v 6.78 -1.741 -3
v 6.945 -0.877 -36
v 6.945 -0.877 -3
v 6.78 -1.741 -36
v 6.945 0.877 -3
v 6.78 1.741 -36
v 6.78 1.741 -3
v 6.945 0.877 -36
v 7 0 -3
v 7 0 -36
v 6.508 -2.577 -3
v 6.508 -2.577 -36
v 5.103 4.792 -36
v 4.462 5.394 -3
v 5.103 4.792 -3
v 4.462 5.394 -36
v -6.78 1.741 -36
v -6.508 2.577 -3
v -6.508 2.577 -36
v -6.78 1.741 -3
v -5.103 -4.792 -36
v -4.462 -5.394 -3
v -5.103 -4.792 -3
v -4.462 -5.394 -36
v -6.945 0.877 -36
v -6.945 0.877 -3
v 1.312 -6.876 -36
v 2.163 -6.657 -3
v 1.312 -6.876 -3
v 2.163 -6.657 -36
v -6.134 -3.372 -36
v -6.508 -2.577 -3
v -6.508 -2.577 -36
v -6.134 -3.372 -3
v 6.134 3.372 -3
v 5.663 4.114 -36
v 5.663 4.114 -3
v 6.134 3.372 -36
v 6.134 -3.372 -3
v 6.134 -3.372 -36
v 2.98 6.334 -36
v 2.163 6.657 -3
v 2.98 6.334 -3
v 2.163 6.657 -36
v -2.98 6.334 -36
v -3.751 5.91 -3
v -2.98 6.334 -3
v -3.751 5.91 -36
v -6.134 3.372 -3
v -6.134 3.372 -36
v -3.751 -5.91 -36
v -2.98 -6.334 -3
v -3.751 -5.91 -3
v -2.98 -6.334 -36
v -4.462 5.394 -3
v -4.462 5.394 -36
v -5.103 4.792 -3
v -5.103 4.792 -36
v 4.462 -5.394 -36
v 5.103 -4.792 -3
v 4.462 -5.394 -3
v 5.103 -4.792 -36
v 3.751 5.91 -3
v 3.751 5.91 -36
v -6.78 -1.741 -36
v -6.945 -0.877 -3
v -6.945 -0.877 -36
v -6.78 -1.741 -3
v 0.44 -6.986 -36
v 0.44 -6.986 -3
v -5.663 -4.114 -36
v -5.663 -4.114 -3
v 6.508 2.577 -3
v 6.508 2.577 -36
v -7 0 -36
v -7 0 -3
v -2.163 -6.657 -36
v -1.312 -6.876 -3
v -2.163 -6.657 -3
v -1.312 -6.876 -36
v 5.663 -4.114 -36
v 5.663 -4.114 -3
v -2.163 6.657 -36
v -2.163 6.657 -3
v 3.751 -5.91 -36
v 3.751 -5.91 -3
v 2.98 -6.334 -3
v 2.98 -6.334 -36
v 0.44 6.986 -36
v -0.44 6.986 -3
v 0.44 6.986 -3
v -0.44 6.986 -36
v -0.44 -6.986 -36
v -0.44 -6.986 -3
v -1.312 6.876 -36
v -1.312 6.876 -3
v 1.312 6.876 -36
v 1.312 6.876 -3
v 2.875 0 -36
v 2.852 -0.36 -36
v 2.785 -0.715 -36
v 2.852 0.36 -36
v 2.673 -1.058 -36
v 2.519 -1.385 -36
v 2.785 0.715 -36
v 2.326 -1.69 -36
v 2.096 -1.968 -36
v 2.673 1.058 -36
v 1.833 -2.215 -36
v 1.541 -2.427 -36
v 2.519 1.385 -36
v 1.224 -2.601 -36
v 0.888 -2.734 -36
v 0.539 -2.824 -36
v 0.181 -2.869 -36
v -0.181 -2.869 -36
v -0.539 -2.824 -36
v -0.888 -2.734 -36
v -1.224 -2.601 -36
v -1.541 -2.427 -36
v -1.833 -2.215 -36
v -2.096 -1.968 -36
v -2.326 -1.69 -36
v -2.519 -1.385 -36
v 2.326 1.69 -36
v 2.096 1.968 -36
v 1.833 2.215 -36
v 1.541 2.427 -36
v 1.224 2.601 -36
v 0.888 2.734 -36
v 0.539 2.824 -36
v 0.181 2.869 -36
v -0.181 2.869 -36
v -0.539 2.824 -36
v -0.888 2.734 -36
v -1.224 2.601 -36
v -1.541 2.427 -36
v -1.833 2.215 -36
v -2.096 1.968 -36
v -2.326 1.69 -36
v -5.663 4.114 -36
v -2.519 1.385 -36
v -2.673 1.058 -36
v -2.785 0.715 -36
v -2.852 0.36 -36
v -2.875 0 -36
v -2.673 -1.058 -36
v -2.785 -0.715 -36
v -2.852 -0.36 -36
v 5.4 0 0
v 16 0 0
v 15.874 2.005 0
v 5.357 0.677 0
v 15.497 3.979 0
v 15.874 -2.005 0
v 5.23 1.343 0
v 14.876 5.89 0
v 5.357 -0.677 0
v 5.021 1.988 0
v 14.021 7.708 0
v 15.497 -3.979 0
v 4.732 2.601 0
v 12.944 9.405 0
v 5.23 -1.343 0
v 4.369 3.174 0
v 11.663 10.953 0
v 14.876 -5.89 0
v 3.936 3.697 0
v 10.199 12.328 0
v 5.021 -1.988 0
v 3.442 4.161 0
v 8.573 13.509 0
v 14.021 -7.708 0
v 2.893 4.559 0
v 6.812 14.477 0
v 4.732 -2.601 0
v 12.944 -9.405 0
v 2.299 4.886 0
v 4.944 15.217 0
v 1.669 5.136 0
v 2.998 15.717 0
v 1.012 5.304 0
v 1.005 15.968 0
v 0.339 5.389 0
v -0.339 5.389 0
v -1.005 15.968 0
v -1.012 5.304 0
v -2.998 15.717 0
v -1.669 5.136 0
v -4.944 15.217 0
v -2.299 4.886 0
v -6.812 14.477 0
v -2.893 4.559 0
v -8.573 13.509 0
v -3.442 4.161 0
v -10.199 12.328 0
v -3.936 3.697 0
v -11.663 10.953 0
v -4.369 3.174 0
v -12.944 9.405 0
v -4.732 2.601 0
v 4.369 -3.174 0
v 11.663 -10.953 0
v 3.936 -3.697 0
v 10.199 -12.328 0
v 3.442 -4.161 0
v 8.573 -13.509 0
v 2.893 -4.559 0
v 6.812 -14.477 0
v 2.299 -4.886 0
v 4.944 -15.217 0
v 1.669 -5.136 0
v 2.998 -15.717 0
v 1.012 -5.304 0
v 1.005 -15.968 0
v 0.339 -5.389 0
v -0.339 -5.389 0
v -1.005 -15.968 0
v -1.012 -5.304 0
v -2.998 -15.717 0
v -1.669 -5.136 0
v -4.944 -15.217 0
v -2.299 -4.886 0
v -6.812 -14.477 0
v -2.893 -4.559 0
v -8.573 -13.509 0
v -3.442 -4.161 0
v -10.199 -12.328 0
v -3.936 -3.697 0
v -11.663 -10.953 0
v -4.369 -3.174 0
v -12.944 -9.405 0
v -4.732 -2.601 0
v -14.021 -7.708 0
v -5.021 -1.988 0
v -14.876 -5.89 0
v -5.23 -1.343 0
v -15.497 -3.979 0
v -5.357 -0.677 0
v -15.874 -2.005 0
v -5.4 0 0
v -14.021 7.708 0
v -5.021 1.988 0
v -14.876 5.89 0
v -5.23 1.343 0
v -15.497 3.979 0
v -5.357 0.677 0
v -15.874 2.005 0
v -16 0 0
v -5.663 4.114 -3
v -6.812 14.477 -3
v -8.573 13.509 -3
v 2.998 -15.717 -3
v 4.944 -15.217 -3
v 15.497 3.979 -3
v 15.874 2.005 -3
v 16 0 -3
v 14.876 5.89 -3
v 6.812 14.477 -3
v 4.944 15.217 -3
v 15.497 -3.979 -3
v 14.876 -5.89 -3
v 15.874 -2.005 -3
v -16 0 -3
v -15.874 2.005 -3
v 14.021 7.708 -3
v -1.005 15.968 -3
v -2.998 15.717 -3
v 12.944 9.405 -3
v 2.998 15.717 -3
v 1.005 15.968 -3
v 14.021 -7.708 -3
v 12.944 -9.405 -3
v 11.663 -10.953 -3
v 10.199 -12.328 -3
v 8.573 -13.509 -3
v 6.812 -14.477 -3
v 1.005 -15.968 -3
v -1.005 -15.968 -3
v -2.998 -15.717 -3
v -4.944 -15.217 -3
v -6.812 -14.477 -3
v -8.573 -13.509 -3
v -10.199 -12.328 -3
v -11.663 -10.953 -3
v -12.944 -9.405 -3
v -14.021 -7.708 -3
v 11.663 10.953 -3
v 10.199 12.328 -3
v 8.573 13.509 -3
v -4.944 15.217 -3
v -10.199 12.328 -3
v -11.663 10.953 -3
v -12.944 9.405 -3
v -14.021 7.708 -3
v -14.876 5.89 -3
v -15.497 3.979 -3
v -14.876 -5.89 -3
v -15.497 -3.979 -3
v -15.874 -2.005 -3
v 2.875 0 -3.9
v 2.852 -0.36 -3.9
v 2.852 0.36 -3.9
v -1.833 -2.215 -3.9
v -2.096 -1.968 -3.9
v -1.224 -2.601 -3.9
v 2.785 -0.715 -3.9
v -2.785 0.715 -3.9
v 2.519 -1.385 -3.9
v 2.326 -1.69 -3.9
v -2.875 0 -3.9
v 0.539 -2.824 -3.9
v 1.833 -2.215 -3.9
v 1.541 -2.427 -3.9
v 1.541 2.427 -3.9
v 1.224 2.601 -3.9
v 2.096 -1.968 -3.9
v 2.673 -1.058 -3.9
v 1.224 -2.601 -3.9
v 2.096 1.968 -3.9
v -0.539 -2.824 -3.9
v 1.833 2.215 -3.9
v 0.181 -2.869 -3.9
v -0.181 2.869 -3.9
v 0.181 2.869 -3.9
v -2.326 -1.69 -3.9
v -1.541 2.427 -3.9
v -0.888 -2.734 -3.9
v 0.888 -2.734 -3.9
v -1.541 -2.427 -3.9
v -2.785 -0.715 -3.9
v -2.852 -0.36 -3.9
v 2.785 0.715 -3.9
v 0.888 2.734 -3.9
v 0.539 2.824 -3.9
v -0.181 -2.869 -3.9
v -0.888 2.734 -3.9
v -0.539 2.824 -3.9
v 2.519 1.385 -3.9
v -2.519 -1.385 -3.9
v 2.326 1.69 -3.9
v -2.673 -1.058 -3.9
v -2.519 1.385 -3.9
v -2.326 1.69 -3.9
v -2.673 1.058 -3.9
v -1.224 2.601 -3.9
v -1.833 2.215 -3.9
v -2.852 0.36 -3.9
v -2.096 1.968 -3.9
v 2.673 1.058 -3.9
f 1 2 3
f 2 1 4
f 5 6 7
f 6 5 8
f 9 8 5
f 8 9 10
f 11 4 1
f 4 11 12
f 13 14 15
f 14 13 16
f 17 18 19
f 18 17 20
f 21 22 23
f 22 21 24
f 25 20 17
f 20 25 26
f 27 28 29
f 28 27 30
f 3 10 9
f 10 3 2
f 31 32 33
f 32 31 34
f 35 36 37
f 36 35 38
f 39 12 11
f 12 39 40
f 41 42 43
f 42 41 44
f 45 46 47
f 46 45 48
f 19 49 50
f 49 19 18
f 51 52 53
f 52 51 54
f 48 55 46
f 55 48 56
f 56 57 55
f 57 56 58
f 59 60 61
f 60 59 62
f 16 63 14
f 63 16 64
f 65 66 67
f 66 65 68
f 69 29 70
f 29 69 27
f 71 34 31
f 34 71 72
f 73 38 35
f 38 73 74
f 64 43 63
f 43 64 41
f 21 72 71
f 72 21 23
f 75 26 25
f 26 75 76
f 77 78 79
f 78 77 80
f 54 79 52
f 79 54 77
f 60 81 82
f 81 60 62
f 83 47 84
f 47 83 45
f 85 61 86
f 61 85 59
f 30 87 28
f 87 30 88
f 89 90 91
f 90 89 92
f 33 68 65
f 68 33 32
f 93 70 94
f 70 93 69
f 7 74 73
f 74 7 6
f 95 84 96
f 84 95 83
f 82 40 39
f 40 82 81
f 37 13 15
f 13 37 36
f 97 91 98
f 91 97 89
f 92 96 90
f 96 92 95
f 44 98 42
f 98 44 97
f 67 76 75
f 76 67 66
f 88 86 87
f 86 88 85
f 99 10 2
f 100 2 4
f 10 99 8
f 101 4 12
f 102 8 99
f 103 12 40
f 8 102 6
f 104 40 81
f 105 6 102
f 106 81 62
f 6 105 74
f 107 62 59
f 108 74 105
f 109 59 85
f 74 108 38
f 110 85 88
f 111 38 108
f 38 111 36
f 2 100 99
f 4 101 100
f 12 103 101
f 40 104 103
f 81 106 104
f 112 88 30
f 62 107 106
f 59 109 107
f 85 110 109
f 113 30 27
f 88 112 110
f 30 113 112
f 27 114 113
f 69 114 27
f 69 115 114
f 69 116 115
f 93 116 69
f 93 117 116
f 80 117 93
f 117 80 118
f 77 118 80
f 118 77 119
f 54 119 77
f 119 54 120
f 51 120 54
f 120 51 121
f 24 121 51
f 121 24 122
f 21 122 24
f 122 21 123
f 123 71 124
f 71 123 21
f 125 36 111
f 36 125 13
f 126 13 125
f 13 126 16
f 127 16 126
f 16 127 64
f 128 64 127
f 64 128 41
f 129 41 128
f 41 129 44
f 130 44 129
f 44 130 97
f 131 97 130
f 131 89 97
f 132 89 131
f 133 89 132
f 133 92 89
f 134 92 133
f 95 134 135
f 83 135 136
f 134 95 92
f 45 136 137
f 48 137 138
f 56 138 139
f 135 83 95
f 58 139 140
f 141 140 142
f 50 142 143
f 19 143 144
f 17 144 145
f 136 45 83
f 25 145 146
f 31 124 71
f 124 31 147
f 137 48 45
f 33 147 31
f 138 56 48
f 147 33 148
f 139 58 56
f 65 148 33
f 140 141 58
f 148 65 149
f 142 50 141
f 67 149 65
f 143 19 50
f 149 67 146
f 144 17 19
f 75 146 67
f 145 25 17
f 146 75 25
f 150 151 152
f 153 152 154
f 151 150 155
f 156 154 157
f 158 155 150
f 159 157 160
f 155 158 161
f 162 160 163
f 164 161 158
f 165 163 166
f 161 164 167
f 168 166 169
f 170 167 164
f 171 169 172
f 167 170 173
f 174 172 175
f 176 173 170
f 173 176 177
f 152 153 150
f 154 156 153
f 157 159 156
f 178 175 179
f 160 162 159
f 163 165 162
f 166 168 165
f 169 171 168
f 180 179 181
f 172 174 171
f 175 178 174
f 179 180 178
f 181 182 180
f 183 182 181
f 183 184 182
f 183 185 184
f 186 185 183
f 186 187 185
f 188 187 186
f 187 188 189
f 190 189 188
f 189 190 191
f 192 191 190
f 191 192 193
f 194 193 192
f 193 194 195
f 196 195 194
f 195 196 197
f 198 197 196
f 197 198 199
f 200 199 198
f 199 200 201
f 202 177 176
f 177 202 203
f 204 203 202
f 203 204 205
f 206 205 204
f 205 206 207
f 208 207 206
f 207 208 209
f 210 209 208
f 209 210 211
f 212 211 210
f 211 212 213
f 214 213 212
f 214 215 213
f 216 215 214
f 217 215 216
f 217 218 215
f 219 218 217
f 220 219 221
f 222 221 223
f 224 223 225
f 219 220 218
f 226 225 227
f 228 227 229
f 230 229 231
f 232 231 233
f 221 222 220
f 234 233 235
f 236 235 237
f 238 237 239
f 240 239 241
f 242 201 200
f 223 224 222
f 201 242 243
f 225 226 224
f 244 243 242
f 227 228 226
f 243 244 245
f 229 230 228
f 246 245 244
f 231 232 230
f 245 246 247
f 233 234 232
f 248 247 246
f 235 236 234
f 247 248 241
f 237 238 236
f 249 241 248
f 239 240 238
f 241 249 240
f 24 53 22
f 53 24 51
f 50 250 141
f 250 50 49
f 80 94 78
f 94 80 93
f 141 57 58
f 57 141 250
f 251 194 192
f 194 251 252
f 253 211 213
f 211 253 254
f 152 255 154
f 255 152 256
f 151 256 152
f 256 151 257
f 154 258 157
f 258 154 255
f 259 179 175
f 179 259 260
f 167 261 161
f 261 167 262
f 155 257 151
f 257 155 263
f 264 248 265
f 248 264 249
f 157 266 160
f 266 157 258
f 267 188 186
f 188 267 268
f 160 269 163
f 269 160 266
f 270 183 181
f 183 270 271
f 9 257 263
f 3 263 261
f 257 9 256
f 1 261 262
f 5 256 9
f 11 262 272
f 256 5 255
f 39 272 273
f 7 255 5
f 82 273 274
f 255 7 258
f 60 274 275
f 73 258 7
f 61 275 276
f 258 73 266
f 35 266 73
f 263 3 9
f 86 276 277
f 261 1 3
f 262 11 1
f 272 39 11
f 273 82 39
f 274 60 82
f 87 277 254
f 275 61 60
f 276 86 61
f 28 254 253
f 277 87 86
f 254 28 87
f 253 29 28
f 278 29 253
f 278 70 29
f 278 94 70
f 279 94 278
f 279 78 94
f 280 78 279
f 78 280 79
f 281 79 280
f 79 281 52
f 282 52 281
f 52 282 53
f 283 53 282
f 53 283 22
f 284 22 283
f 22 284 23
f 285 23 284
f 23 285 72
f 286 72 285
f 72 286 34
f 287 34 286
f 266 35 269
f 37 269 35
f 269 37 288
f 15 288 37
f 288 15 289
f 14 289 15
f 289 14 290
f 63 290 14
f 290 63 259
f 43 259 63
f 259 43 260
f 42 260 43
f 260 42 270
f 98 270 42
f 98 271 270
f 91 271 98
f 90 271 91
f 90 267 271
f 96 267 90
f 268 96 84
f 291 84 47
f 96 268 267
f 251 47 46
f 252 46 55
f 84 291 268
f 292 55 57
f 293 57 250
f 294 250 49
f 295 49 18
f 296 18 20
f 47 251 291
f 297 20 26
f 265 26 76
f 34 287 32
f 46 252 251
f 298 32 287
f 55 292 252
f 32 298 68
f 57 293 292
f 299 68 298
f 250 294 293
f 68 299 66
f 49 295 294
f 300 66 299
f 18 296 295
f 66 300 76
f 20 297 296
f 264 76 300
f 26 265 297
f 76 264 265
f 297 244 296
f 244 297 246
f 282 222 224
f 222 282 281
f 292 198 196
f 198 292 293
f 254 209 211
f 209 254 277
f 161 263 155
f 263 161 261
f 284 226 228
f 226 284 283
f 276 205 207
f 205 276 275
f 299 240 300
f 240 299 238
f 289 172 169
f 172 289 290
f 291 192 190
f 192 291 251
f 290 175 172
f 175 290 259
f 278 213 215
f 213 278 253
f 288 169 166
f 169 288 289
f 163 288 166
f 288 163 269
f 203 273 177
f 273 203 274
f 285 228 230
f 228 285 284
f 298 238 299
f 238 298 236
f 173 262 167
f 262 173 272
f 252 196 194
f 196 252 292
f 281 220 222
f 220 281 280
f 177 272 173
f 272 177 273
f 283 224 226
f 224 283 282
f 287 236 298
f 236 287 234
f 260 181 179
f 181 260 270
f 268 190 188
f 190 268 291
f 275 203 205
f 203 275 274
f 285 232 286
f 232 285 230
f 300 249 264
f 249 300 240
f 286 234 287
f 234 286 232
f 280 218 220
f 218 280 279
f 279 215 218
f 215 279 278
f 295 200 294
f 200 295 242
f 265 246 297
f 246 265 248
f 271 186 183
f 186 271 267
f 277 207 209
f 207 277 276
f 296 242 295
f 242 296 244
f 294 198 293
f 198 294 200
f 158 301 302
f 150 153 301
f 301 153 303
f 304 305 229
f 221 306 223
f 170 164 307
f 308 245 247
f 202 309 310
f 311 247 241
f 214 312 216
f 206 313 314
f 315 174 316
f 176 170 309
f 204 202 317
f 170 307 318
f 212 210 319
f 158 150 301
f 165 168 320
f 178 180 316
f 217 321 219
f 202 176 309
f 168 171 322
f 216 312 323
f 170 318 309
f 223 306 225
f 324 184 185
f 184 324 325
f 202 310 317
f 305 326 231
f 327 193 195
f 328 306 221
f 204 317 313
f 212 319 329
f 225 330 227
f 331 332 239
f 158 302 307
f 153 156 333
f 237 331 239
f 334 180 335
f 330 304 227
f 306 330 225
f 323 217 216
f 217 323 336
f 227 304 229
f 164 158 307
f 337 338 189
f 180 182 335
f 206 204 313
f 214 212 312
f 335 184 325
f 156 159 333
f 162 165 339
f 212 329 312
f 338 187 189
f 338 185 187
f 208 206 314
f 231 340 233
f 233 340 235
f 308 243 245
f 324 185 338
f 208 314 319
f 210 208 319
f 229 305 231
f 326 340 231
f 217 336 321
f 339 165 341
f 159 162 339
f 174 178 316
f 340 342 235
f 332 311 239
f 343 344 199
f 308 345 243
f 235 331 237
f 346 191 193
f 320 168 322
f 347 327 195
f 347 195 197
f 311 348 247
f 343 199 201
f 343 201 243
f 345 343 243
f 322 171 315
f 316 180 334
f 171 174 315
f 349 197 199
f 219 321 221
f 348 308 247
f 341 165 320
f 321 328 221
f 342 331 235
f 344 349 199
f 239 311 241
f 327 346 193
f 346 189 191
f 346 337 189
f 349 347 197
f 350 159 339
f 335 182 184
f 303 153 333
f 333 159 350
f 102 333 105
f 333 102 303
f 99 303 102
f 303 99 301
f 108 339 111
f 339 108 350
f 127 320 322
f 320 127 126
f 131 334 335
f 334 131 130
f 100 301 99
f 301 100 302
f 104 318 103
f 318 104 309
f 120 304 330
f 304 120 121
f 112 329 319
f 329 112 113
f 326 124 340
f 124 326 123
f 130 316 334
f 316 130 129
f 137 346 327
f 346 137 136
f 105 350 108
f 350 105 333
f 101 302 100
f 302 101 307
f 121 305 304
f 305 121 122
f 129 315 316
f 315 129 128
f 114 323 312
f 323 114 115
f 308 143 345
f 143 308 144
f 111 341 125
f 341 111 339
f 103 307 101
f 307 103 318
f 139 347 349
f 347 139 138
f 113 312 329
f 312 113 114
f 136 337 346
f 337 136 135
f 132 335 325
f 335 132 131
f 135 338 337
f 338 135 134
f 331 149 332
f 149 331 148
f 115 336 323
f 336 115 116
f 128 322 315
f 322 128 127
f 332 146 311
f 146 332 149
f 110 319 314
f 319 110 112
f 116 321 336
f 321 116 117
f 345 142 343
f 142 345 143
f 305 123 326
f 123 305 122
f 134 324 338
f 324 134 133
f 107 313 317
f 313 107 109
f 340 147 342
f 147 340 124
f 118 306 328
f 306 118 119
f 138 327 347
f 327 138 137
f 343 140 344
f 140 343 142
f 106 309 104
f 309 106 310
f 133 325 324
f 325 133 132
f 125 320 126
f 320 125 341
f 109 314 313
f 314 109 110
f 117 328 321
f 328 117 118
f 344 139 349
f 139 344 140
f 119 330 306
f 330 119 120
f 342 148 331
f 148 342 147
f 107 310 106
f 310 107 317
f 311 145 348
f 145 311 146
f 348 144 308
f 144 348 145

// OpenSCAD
$fn = 50;


difference() {
	union() {
		translate(v = [0, 0, -36.0000000000]) {
			cylinder(h = 36, r = 7.0000000000);
		}
		translate(v = [0, 0, -3.0000000000]) {
			cylinder(h = 3, r = 16.0000000000);
		}
	}
	union() {
		translate(v = [0, 0, 0]) {
			rotate(a = [0, 0, 0]) {
				difference() {
					union() {
						#translate(v = [0, 0, -36.0000000000]) {
							cylinder(h = 36, r = 2.6000000000);
						}
						#translate(v = [0, 0, -3.9000000000]) {
							cylinder(h = 3.9000000000, r1 = 2.8750000000, r2 = 5.4000000000);
						}
						#translate(v = [0, 0, -36.0000000000]) {
							cylinder(h = 36, r = 2.8750000000);
						}
						#translate(v = [0, 0, -36.0000000000]) {
							cylinder(h = 36, r = 2.6000000000);
						}
					}
					union();
				}
			}
		}
	}
}
